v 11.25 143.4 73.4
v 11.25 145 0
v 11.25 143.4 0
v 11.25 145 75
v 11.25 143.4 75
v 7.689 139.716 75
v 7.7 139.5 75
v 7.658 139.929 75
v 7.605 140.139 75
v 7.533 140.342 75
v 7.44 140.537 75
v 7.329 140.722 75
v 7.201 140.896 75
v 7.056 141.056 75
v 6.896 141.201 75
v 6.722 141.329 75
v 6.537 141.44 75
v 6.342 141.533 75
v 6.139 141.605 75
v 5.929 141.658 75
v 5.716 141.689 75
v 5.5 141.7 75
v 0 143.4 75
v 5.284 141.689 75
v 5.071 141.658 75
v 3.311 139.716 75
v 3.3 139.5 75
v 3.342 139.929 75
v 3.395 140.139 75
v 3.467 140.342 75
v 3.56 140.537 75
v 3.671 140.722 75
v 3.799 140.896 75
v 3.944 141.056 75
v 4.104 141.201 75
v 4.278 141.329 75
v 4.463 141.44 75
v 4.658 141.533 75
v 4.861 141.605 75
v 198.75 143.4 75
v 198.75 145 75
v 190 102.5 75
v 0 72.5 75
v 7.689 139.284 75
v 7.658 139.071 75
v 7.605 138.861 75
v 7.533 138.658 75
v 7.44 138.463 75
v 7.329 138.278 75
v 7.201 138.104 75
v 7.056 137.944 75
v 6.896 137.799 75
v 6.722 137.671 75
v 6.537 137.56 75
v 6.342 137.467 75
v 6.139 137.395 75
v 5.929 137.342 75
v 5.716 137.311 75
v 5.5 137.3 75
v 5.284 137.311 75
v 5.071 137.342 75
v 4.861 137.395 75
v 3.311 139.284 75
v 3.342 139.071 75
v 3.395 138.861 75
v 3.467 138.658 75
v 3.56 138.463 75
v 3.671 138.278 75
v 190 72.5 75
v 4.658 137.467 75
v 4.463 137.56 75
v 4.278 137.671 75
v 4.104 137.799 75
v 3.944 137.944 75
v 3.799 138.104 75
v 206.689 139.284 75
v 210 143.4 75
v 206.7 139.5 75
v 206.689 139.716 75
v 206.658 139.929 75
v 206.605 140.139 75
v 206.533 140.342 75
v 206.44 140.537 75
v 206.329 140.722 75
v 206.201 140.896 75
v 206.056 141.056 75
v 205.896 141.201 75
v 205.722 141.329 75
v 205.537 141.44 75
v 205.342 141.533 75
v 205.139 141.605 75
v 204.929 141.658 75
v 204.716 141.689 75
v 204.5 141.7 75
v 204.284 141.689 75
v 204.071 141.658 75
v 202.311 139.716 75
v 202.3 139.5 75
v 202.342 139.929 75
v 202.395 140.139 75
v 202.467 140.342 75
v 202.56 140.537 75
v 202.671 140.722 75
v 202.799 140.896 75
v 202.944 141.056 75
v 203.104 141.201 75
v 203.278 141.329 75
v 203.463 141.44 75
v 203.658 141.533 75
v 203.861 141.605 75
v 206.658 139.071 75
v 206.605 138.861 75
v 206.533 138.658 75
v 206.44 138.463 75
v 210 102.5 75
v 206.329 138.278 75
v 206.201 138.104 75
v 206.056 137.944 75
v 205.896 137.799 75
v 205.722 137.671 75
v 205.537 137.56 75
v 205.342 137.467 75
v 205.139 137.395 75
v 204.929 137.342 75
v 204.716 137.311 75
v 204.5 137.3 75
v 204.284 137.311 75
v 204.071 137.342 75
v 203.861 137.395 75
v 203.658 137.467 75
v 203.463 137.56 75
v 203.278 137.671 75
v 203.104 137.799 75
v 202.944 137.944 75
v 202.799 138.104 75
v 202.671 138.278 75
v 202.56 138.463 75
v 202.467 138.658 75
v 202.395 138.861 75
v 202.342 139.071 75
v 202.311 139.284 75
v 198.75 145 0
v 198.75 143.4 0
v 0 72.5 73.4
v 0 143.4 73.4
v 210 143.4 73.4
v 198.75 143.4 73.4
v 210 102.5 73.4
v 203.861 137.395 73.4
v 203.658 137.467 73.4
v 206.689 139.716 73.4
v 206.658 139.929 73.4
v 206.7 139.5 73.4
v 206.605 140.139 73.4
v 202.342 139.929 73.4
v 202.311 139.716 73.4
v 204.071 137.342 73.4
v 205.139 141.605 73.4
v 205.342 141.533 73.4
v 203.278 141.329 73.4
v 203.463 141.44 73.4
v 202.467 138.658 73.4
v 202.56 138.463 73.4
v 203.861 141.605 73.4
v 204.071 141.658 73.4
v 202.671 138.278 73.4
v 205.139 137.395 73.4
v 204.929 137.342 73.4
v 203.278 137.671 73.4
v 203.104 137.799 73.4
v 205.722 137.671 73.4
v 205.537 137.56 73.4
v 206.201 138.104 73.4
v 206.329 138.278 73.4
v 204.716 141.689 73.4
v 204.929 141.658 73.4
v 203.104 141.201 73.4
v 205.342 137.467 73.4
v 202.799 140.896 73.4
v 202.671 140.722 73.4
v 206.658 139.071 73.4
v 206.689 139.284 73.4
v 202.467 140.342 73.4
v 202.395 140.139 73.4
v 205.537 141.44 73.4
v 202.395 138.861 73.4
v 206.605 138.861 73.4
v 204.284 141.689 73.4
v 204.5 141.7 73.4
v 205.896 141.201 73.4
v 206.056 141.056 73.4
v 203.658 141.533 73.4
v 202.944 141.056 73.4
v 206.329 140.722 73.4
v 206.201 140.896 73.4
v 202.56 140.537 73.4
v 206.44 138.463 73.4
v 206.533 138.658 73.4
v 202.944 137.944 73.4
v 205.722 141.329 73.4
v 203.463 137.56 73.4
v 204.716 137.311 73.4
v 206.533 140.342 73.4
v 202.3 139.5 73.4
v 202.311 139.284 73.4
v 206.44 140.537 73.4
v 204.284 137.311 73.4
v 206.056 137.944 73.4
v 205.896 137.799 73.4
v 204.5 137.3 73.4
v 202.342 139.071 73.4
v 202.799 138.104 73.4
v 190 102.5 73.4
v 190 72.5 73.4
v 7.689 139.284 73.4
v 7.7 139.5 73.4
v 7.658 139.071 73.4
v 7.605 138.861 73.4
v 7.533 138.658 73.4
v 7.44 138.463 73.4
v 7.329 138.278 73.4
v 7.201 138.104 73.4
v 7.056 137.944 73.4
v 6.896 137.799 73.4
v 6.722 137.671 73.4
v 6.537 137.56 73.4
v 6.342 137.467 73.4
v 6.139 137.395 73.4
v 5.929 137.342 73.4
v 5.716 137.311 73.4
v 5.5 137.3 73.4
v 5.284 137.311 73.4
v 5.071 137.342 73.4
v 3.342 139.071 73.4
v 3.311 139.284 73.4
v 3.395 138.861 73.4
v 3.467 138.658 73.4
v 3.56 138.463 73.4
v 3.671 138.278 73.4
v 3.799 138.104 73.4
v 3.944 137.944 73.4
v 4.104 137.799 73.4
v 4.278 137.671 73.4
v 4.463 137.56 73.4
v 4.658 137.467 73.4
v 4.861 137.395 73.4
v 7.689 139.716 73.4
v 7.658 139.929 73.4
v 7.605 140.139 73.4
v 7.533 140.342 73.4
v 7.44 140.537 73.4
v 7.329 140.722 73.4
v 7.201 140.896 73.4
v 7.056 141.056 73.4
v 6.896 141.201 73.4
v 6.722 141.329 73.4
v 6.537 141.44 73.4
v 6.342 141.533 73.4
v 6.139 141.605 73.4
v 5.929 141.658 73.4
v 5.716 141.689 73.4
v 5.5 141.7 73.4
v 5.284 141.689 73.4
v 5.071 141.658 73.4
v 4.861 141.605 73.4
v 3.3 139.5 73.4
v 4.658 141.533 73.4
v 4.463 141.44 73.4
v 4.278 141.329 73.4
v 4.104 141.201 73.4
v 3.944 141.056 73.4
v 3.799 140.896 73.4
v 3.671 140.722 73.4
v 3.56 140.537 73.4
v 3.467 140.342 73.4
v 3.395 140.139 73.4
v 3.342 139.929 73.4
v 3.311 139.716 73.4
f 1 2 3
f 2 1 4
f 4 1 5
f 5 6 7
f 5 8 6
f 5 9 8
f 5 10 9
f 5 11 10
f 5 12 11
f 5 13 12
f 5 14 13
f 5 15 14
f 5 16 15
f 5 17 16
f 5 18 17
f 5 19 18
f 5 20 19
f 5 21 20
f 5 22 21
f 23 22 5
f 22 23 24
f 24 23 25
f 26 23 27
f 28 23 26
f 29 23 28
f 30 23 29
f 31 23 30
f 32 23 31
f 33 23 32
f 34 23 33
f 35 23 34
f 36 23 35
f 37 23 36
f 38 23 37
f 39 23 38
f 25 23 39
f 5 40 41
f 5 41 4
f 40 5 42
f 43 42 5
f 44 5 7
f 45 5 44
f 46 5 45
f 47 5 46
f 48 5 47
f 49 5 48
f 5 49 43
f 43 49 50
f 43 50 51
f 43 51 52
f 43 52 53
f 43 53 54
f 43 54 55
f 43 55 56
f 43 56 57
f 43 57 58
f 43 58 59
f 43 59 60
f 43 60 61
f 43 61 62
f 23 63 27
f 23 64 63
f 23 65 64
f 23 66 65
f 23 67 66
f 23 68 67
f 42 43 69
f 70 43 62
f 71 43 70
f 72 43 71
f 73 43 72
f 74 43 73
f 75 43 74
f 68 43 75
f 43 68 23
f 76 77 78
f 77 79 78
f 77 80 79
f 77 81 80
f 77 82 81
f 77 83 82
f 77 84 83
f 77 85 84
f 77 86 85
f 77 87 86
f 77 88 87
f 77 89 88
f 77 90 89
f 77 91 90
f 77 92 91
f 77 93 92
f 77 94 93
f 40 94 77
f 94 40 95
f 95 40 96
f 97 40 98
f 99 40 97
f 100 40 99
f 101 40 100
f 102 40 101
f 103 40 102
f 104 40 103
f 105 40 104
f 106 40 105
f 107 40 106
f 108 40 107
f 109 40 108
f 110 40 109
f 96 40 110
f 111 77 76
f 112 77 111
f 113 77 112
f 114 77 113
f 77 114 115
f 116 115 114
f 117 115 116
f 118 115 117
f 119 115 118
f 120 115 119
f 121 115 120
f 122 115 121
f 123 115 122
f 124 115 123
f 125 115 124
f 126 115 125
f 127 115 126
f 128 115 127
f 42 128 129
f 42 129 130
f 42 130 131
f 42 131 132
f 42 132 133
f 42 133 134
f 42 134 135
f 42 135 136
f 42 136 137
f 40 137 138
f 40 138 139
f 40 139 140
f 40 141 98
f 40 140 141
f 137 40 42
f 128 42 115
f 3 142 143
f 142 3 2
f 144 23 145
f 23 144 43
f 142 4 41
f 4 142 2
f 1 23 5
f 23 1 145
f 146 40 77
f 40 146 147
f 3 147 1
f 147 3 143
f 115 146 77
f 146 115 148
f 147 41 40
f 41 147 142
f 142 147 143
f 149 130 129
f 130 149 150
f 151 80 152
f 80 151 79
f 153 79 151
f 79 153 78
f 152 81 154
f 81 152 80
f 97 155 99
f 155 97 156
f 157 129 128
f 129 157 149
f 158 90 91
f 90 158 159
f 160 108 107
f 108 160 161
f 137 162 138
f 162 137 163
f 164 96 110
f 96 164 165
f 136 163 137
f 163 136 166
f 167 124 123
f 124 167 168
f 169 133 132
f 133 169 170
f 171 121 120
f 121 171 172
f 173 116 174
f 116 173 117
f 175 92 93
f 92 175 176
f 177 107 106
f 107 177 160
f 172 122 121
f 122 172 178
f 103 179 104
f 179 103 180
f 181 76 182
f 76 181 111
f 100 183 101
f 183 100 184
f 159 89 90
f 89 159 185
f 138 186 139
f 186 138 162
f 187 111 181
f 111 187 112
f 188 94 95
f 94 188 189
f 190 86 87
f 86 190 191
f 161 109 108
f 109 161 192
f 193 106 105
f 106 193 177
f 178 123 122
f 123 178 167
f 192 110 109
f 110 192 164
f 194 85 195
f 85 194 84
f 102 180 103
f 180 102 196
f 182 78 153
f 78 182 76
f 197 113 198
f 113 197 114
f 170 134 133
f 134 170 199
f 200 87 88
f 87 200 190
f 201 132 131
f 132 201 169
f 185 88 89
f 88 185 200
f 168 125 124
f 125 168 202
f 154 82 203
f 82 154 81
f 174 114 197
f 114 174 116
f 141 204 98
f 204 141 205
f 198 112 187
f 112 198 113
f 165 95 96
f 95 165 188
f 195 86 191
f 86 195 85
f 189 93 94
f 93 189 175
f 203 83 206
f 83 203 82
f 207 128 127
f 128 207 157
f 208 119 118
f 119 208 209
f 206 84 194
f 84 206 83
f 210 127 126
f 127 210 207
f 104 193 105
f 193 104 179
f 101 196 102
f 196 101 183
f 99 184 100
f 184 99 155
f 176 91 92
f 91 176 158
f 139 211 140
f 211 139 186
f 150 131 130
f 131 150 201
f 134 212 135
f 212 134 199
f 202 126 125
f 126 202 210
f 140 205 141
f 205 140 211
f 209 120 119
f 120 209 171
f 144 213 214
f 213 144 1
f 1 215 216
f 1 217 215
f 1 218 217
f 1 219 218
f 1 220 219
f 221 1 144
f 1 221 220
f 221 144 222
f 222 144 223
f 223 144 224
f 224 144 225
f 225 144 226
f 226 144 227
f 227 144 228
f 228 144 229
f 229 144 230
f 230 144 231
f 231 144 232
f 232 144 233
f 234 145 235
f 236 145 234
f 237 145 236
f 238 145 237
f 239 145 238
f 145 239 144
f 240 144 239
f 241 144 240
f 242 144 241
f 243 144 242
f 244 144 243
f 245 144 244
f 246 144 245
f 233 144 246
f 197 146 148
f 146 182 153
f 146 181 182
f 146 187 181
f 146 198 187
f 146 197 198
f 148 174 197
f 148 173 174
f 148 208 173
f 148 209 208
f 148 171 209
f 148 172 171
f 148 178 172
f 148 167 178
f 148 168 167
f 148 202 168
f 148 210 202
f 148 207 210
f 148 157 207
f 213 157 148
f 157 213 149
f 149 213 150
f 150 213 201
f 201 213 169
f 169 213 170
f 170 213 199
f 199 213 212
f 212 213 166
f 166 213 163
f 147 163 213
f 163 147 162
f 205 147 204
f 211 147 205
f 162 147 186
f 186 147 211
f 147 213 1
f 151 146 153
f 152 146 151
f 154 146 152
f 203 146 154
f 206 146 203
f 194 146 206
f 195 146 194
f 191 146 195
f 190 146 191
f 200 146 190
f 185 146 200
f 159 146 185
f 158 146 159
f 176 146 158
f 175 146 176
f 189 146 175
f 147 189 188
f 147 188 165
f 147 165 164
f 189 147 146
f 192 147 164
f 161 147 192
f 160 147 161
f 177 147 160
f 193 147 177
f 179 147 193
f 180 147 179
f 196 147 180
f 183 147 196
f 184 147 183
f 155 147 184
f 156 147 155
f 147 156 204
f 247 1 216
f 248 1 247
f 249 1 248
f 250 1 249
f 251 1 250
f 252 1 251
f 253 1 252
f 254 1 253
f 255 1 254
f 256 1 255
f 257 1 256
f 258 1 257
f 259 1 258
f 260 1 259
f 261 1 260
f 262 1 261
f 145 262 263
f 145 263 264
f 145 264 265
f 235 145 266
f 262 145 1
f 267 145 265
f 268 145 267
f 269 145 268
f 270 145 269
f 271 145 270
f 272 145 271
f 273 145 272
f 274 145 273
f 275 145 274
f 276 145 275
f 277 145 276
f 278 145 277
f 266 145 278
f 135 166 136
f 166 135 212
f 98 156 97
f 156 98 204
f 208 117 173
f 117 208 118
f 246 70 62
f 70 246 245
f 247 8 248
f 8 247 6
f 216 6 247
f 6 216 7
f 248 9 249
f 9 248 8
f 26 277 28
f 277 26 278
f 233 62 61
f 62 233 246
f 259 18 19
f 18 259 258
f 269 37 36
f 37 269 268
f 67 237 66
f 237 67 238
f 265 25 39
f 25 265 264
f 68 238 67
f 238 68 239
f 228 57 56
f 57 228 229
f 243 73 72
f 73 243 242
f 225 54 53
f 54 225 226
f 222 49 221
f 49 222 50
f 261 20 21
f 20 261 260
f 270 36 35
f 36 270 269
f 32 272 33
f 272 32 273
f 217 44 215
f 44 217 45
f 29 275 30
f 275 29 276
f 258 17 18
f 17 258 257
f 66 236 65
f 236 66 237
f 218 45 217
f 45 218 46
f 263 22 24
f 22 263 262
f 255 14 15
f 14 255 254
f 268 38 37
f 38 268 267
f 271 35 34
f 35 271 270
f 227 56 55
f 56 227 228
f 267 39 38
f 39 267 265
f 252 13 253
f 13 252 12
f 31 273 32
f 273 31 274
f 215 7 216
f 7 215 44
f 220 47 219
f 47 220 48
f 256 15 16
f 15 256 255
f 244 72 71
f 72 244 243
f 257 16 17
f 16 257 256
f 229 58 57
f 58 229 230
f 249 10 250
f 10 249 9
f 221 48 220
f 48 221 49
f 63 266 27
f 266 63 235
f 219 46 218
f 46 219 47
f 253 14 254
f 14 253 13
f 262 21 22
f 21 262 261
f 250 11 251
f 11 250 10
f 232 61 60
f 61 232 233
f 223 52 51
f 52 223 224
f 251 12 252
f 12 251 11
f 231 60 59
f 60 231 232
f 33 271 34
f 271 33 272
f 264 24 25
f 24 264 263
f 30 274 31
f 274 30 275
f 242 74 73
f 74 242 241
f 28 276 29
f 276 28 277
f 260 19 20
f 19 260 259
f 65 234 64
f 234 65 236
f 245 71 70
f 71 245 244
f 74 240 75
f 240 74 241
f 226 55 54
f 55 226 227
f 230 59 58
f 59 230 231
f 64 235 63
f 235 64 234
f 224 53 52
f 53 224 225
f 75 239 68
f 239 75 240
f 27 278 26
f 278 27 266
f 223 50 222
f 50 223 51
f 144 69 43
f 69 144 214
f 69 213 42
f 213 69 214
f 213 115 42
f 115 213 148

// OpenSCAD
$fn = 64;

t = 1.6;

// External dimensions
X = 210;
Y = 145;
Z = 75;

// Flange M4 inner and outer diameters
d_M4_outer = 11;
d_M4_inner = 5.25;


module flangeM4(h=Z) {
    difference() {
        cylinder(h=h, d=d_M4_outer, center=false);
        cylinder(h=h, d=d_M4_inner, center=false);
        translate([0, 0, h-1]) cylinder(h=1, d1=d_M4_inner, d2=d_M4_inner + 2, center=false);
        cylinder(h=1, d1=d_M4_inner + 2, d2=d_M4_inner, center=false);
    }
}


module flangeM3(h_drill=6) {
    d_inner = 3.85;
    d_outer = d_inner + 2*t;
    h = h_drill + t;
    difference() {
        cylinder(h=h, d=d_outer, center=false);
        translate([0, 0, t]) cylinder(h=h_drill, d=d_inner, center=false);
        translate([0, 0, h-1.5]) cylinder(h=1.5, d1=d_inner, d2=d_inner + 1, center=false);
    }
}


module flangesM3_matek(x=30.5) {
    flangeM3();
    translate([x, 0, 0]) flangeM3();
    translate([x, x, 0]) flangeM3();
    translate([0, x, 0]) flangeM3();
}


module flanges_outer(x=d_M4_outer/2) {
    translate([x, x, 0]) flangeM4();
    translate([X - x, Y - x, 0]) flangeM4();
    translate([X - x, x, 0]) flangeM4();
    translate([x, Y - x, 0]) flangeM4();
}

module m4_holes(d, x=d_M4_outer/2, z=0) {
    translate([x, x, z]) cylinder(h=t, d=d);
    translate([X - x, Y - x, z]) cylinder(h=t, d=d);
    translate([X - x, x, z]) cylinder(h=t, d=d);
    translate([x, Y - x, z]) cylinder(h=t, d=d);
}


module walls_extra(margin=0.0) {
    translate([0, Y-t, 0]) cube([d_M4_outer+margin, t, Z]);
    translate([X-d_M4_outer-margin, Y-t, 0]) cube([d_M4_outer+margin, t, Z]);
}


module wifi_holes() {
    translate([t, 0, 0])
    rotate([0, -90, 0])
    linear_extrude(h=t) {
        translate([11.5+t, 66+15]) circle(d=15);
        translate([11.5+t, 100+15]) circle(d=15);
    }
}


module bottom_case() {
    hole_size_y = 35;
    hole_size_z = 25;
    difference() {
        cube([X, Y, Z]);
        translate([t, t, t]) cube([X-2*t, Y, Z]);
        translate([X - t, Y - d_M4_outer - hole_size_y, t+2]) cube([t, hole_size_y, hole_size_z]);
        m4_holes(d=d_M4_inner, z=0);
        wifi_holes();
    }
    walls_extra();
    translate([X - 40, Y - 45, 0]) flangesM3_matek();
    %translate([t, 15, t]) cube([110, 115, 30]);
    flanges_outer();
}


module top_case_half1() {
    cut_x = 20;
    cut_y = 30;
    difference() {
        cube([X, Y, Z]);
        cube([X, Y-t, Z-t]);
        cube([X, Y/2, Z]);
        translate([X-cut_x, Y/2, 0]) cube([cut_x, cut_y, Z]);
        walls_extra(margin=0.25);
        m4_holes(d=4.4, z=Z-t);
    }
}


module top_case_half2(margin=0.25) {
    difference() {
        cube([X, Y/2-margin, t]);
        m4_holes(d=4.4, z=0);
    }
}

//bottom_case();
top_case_half1();
//top_case_half2();
//wifi_holes();
